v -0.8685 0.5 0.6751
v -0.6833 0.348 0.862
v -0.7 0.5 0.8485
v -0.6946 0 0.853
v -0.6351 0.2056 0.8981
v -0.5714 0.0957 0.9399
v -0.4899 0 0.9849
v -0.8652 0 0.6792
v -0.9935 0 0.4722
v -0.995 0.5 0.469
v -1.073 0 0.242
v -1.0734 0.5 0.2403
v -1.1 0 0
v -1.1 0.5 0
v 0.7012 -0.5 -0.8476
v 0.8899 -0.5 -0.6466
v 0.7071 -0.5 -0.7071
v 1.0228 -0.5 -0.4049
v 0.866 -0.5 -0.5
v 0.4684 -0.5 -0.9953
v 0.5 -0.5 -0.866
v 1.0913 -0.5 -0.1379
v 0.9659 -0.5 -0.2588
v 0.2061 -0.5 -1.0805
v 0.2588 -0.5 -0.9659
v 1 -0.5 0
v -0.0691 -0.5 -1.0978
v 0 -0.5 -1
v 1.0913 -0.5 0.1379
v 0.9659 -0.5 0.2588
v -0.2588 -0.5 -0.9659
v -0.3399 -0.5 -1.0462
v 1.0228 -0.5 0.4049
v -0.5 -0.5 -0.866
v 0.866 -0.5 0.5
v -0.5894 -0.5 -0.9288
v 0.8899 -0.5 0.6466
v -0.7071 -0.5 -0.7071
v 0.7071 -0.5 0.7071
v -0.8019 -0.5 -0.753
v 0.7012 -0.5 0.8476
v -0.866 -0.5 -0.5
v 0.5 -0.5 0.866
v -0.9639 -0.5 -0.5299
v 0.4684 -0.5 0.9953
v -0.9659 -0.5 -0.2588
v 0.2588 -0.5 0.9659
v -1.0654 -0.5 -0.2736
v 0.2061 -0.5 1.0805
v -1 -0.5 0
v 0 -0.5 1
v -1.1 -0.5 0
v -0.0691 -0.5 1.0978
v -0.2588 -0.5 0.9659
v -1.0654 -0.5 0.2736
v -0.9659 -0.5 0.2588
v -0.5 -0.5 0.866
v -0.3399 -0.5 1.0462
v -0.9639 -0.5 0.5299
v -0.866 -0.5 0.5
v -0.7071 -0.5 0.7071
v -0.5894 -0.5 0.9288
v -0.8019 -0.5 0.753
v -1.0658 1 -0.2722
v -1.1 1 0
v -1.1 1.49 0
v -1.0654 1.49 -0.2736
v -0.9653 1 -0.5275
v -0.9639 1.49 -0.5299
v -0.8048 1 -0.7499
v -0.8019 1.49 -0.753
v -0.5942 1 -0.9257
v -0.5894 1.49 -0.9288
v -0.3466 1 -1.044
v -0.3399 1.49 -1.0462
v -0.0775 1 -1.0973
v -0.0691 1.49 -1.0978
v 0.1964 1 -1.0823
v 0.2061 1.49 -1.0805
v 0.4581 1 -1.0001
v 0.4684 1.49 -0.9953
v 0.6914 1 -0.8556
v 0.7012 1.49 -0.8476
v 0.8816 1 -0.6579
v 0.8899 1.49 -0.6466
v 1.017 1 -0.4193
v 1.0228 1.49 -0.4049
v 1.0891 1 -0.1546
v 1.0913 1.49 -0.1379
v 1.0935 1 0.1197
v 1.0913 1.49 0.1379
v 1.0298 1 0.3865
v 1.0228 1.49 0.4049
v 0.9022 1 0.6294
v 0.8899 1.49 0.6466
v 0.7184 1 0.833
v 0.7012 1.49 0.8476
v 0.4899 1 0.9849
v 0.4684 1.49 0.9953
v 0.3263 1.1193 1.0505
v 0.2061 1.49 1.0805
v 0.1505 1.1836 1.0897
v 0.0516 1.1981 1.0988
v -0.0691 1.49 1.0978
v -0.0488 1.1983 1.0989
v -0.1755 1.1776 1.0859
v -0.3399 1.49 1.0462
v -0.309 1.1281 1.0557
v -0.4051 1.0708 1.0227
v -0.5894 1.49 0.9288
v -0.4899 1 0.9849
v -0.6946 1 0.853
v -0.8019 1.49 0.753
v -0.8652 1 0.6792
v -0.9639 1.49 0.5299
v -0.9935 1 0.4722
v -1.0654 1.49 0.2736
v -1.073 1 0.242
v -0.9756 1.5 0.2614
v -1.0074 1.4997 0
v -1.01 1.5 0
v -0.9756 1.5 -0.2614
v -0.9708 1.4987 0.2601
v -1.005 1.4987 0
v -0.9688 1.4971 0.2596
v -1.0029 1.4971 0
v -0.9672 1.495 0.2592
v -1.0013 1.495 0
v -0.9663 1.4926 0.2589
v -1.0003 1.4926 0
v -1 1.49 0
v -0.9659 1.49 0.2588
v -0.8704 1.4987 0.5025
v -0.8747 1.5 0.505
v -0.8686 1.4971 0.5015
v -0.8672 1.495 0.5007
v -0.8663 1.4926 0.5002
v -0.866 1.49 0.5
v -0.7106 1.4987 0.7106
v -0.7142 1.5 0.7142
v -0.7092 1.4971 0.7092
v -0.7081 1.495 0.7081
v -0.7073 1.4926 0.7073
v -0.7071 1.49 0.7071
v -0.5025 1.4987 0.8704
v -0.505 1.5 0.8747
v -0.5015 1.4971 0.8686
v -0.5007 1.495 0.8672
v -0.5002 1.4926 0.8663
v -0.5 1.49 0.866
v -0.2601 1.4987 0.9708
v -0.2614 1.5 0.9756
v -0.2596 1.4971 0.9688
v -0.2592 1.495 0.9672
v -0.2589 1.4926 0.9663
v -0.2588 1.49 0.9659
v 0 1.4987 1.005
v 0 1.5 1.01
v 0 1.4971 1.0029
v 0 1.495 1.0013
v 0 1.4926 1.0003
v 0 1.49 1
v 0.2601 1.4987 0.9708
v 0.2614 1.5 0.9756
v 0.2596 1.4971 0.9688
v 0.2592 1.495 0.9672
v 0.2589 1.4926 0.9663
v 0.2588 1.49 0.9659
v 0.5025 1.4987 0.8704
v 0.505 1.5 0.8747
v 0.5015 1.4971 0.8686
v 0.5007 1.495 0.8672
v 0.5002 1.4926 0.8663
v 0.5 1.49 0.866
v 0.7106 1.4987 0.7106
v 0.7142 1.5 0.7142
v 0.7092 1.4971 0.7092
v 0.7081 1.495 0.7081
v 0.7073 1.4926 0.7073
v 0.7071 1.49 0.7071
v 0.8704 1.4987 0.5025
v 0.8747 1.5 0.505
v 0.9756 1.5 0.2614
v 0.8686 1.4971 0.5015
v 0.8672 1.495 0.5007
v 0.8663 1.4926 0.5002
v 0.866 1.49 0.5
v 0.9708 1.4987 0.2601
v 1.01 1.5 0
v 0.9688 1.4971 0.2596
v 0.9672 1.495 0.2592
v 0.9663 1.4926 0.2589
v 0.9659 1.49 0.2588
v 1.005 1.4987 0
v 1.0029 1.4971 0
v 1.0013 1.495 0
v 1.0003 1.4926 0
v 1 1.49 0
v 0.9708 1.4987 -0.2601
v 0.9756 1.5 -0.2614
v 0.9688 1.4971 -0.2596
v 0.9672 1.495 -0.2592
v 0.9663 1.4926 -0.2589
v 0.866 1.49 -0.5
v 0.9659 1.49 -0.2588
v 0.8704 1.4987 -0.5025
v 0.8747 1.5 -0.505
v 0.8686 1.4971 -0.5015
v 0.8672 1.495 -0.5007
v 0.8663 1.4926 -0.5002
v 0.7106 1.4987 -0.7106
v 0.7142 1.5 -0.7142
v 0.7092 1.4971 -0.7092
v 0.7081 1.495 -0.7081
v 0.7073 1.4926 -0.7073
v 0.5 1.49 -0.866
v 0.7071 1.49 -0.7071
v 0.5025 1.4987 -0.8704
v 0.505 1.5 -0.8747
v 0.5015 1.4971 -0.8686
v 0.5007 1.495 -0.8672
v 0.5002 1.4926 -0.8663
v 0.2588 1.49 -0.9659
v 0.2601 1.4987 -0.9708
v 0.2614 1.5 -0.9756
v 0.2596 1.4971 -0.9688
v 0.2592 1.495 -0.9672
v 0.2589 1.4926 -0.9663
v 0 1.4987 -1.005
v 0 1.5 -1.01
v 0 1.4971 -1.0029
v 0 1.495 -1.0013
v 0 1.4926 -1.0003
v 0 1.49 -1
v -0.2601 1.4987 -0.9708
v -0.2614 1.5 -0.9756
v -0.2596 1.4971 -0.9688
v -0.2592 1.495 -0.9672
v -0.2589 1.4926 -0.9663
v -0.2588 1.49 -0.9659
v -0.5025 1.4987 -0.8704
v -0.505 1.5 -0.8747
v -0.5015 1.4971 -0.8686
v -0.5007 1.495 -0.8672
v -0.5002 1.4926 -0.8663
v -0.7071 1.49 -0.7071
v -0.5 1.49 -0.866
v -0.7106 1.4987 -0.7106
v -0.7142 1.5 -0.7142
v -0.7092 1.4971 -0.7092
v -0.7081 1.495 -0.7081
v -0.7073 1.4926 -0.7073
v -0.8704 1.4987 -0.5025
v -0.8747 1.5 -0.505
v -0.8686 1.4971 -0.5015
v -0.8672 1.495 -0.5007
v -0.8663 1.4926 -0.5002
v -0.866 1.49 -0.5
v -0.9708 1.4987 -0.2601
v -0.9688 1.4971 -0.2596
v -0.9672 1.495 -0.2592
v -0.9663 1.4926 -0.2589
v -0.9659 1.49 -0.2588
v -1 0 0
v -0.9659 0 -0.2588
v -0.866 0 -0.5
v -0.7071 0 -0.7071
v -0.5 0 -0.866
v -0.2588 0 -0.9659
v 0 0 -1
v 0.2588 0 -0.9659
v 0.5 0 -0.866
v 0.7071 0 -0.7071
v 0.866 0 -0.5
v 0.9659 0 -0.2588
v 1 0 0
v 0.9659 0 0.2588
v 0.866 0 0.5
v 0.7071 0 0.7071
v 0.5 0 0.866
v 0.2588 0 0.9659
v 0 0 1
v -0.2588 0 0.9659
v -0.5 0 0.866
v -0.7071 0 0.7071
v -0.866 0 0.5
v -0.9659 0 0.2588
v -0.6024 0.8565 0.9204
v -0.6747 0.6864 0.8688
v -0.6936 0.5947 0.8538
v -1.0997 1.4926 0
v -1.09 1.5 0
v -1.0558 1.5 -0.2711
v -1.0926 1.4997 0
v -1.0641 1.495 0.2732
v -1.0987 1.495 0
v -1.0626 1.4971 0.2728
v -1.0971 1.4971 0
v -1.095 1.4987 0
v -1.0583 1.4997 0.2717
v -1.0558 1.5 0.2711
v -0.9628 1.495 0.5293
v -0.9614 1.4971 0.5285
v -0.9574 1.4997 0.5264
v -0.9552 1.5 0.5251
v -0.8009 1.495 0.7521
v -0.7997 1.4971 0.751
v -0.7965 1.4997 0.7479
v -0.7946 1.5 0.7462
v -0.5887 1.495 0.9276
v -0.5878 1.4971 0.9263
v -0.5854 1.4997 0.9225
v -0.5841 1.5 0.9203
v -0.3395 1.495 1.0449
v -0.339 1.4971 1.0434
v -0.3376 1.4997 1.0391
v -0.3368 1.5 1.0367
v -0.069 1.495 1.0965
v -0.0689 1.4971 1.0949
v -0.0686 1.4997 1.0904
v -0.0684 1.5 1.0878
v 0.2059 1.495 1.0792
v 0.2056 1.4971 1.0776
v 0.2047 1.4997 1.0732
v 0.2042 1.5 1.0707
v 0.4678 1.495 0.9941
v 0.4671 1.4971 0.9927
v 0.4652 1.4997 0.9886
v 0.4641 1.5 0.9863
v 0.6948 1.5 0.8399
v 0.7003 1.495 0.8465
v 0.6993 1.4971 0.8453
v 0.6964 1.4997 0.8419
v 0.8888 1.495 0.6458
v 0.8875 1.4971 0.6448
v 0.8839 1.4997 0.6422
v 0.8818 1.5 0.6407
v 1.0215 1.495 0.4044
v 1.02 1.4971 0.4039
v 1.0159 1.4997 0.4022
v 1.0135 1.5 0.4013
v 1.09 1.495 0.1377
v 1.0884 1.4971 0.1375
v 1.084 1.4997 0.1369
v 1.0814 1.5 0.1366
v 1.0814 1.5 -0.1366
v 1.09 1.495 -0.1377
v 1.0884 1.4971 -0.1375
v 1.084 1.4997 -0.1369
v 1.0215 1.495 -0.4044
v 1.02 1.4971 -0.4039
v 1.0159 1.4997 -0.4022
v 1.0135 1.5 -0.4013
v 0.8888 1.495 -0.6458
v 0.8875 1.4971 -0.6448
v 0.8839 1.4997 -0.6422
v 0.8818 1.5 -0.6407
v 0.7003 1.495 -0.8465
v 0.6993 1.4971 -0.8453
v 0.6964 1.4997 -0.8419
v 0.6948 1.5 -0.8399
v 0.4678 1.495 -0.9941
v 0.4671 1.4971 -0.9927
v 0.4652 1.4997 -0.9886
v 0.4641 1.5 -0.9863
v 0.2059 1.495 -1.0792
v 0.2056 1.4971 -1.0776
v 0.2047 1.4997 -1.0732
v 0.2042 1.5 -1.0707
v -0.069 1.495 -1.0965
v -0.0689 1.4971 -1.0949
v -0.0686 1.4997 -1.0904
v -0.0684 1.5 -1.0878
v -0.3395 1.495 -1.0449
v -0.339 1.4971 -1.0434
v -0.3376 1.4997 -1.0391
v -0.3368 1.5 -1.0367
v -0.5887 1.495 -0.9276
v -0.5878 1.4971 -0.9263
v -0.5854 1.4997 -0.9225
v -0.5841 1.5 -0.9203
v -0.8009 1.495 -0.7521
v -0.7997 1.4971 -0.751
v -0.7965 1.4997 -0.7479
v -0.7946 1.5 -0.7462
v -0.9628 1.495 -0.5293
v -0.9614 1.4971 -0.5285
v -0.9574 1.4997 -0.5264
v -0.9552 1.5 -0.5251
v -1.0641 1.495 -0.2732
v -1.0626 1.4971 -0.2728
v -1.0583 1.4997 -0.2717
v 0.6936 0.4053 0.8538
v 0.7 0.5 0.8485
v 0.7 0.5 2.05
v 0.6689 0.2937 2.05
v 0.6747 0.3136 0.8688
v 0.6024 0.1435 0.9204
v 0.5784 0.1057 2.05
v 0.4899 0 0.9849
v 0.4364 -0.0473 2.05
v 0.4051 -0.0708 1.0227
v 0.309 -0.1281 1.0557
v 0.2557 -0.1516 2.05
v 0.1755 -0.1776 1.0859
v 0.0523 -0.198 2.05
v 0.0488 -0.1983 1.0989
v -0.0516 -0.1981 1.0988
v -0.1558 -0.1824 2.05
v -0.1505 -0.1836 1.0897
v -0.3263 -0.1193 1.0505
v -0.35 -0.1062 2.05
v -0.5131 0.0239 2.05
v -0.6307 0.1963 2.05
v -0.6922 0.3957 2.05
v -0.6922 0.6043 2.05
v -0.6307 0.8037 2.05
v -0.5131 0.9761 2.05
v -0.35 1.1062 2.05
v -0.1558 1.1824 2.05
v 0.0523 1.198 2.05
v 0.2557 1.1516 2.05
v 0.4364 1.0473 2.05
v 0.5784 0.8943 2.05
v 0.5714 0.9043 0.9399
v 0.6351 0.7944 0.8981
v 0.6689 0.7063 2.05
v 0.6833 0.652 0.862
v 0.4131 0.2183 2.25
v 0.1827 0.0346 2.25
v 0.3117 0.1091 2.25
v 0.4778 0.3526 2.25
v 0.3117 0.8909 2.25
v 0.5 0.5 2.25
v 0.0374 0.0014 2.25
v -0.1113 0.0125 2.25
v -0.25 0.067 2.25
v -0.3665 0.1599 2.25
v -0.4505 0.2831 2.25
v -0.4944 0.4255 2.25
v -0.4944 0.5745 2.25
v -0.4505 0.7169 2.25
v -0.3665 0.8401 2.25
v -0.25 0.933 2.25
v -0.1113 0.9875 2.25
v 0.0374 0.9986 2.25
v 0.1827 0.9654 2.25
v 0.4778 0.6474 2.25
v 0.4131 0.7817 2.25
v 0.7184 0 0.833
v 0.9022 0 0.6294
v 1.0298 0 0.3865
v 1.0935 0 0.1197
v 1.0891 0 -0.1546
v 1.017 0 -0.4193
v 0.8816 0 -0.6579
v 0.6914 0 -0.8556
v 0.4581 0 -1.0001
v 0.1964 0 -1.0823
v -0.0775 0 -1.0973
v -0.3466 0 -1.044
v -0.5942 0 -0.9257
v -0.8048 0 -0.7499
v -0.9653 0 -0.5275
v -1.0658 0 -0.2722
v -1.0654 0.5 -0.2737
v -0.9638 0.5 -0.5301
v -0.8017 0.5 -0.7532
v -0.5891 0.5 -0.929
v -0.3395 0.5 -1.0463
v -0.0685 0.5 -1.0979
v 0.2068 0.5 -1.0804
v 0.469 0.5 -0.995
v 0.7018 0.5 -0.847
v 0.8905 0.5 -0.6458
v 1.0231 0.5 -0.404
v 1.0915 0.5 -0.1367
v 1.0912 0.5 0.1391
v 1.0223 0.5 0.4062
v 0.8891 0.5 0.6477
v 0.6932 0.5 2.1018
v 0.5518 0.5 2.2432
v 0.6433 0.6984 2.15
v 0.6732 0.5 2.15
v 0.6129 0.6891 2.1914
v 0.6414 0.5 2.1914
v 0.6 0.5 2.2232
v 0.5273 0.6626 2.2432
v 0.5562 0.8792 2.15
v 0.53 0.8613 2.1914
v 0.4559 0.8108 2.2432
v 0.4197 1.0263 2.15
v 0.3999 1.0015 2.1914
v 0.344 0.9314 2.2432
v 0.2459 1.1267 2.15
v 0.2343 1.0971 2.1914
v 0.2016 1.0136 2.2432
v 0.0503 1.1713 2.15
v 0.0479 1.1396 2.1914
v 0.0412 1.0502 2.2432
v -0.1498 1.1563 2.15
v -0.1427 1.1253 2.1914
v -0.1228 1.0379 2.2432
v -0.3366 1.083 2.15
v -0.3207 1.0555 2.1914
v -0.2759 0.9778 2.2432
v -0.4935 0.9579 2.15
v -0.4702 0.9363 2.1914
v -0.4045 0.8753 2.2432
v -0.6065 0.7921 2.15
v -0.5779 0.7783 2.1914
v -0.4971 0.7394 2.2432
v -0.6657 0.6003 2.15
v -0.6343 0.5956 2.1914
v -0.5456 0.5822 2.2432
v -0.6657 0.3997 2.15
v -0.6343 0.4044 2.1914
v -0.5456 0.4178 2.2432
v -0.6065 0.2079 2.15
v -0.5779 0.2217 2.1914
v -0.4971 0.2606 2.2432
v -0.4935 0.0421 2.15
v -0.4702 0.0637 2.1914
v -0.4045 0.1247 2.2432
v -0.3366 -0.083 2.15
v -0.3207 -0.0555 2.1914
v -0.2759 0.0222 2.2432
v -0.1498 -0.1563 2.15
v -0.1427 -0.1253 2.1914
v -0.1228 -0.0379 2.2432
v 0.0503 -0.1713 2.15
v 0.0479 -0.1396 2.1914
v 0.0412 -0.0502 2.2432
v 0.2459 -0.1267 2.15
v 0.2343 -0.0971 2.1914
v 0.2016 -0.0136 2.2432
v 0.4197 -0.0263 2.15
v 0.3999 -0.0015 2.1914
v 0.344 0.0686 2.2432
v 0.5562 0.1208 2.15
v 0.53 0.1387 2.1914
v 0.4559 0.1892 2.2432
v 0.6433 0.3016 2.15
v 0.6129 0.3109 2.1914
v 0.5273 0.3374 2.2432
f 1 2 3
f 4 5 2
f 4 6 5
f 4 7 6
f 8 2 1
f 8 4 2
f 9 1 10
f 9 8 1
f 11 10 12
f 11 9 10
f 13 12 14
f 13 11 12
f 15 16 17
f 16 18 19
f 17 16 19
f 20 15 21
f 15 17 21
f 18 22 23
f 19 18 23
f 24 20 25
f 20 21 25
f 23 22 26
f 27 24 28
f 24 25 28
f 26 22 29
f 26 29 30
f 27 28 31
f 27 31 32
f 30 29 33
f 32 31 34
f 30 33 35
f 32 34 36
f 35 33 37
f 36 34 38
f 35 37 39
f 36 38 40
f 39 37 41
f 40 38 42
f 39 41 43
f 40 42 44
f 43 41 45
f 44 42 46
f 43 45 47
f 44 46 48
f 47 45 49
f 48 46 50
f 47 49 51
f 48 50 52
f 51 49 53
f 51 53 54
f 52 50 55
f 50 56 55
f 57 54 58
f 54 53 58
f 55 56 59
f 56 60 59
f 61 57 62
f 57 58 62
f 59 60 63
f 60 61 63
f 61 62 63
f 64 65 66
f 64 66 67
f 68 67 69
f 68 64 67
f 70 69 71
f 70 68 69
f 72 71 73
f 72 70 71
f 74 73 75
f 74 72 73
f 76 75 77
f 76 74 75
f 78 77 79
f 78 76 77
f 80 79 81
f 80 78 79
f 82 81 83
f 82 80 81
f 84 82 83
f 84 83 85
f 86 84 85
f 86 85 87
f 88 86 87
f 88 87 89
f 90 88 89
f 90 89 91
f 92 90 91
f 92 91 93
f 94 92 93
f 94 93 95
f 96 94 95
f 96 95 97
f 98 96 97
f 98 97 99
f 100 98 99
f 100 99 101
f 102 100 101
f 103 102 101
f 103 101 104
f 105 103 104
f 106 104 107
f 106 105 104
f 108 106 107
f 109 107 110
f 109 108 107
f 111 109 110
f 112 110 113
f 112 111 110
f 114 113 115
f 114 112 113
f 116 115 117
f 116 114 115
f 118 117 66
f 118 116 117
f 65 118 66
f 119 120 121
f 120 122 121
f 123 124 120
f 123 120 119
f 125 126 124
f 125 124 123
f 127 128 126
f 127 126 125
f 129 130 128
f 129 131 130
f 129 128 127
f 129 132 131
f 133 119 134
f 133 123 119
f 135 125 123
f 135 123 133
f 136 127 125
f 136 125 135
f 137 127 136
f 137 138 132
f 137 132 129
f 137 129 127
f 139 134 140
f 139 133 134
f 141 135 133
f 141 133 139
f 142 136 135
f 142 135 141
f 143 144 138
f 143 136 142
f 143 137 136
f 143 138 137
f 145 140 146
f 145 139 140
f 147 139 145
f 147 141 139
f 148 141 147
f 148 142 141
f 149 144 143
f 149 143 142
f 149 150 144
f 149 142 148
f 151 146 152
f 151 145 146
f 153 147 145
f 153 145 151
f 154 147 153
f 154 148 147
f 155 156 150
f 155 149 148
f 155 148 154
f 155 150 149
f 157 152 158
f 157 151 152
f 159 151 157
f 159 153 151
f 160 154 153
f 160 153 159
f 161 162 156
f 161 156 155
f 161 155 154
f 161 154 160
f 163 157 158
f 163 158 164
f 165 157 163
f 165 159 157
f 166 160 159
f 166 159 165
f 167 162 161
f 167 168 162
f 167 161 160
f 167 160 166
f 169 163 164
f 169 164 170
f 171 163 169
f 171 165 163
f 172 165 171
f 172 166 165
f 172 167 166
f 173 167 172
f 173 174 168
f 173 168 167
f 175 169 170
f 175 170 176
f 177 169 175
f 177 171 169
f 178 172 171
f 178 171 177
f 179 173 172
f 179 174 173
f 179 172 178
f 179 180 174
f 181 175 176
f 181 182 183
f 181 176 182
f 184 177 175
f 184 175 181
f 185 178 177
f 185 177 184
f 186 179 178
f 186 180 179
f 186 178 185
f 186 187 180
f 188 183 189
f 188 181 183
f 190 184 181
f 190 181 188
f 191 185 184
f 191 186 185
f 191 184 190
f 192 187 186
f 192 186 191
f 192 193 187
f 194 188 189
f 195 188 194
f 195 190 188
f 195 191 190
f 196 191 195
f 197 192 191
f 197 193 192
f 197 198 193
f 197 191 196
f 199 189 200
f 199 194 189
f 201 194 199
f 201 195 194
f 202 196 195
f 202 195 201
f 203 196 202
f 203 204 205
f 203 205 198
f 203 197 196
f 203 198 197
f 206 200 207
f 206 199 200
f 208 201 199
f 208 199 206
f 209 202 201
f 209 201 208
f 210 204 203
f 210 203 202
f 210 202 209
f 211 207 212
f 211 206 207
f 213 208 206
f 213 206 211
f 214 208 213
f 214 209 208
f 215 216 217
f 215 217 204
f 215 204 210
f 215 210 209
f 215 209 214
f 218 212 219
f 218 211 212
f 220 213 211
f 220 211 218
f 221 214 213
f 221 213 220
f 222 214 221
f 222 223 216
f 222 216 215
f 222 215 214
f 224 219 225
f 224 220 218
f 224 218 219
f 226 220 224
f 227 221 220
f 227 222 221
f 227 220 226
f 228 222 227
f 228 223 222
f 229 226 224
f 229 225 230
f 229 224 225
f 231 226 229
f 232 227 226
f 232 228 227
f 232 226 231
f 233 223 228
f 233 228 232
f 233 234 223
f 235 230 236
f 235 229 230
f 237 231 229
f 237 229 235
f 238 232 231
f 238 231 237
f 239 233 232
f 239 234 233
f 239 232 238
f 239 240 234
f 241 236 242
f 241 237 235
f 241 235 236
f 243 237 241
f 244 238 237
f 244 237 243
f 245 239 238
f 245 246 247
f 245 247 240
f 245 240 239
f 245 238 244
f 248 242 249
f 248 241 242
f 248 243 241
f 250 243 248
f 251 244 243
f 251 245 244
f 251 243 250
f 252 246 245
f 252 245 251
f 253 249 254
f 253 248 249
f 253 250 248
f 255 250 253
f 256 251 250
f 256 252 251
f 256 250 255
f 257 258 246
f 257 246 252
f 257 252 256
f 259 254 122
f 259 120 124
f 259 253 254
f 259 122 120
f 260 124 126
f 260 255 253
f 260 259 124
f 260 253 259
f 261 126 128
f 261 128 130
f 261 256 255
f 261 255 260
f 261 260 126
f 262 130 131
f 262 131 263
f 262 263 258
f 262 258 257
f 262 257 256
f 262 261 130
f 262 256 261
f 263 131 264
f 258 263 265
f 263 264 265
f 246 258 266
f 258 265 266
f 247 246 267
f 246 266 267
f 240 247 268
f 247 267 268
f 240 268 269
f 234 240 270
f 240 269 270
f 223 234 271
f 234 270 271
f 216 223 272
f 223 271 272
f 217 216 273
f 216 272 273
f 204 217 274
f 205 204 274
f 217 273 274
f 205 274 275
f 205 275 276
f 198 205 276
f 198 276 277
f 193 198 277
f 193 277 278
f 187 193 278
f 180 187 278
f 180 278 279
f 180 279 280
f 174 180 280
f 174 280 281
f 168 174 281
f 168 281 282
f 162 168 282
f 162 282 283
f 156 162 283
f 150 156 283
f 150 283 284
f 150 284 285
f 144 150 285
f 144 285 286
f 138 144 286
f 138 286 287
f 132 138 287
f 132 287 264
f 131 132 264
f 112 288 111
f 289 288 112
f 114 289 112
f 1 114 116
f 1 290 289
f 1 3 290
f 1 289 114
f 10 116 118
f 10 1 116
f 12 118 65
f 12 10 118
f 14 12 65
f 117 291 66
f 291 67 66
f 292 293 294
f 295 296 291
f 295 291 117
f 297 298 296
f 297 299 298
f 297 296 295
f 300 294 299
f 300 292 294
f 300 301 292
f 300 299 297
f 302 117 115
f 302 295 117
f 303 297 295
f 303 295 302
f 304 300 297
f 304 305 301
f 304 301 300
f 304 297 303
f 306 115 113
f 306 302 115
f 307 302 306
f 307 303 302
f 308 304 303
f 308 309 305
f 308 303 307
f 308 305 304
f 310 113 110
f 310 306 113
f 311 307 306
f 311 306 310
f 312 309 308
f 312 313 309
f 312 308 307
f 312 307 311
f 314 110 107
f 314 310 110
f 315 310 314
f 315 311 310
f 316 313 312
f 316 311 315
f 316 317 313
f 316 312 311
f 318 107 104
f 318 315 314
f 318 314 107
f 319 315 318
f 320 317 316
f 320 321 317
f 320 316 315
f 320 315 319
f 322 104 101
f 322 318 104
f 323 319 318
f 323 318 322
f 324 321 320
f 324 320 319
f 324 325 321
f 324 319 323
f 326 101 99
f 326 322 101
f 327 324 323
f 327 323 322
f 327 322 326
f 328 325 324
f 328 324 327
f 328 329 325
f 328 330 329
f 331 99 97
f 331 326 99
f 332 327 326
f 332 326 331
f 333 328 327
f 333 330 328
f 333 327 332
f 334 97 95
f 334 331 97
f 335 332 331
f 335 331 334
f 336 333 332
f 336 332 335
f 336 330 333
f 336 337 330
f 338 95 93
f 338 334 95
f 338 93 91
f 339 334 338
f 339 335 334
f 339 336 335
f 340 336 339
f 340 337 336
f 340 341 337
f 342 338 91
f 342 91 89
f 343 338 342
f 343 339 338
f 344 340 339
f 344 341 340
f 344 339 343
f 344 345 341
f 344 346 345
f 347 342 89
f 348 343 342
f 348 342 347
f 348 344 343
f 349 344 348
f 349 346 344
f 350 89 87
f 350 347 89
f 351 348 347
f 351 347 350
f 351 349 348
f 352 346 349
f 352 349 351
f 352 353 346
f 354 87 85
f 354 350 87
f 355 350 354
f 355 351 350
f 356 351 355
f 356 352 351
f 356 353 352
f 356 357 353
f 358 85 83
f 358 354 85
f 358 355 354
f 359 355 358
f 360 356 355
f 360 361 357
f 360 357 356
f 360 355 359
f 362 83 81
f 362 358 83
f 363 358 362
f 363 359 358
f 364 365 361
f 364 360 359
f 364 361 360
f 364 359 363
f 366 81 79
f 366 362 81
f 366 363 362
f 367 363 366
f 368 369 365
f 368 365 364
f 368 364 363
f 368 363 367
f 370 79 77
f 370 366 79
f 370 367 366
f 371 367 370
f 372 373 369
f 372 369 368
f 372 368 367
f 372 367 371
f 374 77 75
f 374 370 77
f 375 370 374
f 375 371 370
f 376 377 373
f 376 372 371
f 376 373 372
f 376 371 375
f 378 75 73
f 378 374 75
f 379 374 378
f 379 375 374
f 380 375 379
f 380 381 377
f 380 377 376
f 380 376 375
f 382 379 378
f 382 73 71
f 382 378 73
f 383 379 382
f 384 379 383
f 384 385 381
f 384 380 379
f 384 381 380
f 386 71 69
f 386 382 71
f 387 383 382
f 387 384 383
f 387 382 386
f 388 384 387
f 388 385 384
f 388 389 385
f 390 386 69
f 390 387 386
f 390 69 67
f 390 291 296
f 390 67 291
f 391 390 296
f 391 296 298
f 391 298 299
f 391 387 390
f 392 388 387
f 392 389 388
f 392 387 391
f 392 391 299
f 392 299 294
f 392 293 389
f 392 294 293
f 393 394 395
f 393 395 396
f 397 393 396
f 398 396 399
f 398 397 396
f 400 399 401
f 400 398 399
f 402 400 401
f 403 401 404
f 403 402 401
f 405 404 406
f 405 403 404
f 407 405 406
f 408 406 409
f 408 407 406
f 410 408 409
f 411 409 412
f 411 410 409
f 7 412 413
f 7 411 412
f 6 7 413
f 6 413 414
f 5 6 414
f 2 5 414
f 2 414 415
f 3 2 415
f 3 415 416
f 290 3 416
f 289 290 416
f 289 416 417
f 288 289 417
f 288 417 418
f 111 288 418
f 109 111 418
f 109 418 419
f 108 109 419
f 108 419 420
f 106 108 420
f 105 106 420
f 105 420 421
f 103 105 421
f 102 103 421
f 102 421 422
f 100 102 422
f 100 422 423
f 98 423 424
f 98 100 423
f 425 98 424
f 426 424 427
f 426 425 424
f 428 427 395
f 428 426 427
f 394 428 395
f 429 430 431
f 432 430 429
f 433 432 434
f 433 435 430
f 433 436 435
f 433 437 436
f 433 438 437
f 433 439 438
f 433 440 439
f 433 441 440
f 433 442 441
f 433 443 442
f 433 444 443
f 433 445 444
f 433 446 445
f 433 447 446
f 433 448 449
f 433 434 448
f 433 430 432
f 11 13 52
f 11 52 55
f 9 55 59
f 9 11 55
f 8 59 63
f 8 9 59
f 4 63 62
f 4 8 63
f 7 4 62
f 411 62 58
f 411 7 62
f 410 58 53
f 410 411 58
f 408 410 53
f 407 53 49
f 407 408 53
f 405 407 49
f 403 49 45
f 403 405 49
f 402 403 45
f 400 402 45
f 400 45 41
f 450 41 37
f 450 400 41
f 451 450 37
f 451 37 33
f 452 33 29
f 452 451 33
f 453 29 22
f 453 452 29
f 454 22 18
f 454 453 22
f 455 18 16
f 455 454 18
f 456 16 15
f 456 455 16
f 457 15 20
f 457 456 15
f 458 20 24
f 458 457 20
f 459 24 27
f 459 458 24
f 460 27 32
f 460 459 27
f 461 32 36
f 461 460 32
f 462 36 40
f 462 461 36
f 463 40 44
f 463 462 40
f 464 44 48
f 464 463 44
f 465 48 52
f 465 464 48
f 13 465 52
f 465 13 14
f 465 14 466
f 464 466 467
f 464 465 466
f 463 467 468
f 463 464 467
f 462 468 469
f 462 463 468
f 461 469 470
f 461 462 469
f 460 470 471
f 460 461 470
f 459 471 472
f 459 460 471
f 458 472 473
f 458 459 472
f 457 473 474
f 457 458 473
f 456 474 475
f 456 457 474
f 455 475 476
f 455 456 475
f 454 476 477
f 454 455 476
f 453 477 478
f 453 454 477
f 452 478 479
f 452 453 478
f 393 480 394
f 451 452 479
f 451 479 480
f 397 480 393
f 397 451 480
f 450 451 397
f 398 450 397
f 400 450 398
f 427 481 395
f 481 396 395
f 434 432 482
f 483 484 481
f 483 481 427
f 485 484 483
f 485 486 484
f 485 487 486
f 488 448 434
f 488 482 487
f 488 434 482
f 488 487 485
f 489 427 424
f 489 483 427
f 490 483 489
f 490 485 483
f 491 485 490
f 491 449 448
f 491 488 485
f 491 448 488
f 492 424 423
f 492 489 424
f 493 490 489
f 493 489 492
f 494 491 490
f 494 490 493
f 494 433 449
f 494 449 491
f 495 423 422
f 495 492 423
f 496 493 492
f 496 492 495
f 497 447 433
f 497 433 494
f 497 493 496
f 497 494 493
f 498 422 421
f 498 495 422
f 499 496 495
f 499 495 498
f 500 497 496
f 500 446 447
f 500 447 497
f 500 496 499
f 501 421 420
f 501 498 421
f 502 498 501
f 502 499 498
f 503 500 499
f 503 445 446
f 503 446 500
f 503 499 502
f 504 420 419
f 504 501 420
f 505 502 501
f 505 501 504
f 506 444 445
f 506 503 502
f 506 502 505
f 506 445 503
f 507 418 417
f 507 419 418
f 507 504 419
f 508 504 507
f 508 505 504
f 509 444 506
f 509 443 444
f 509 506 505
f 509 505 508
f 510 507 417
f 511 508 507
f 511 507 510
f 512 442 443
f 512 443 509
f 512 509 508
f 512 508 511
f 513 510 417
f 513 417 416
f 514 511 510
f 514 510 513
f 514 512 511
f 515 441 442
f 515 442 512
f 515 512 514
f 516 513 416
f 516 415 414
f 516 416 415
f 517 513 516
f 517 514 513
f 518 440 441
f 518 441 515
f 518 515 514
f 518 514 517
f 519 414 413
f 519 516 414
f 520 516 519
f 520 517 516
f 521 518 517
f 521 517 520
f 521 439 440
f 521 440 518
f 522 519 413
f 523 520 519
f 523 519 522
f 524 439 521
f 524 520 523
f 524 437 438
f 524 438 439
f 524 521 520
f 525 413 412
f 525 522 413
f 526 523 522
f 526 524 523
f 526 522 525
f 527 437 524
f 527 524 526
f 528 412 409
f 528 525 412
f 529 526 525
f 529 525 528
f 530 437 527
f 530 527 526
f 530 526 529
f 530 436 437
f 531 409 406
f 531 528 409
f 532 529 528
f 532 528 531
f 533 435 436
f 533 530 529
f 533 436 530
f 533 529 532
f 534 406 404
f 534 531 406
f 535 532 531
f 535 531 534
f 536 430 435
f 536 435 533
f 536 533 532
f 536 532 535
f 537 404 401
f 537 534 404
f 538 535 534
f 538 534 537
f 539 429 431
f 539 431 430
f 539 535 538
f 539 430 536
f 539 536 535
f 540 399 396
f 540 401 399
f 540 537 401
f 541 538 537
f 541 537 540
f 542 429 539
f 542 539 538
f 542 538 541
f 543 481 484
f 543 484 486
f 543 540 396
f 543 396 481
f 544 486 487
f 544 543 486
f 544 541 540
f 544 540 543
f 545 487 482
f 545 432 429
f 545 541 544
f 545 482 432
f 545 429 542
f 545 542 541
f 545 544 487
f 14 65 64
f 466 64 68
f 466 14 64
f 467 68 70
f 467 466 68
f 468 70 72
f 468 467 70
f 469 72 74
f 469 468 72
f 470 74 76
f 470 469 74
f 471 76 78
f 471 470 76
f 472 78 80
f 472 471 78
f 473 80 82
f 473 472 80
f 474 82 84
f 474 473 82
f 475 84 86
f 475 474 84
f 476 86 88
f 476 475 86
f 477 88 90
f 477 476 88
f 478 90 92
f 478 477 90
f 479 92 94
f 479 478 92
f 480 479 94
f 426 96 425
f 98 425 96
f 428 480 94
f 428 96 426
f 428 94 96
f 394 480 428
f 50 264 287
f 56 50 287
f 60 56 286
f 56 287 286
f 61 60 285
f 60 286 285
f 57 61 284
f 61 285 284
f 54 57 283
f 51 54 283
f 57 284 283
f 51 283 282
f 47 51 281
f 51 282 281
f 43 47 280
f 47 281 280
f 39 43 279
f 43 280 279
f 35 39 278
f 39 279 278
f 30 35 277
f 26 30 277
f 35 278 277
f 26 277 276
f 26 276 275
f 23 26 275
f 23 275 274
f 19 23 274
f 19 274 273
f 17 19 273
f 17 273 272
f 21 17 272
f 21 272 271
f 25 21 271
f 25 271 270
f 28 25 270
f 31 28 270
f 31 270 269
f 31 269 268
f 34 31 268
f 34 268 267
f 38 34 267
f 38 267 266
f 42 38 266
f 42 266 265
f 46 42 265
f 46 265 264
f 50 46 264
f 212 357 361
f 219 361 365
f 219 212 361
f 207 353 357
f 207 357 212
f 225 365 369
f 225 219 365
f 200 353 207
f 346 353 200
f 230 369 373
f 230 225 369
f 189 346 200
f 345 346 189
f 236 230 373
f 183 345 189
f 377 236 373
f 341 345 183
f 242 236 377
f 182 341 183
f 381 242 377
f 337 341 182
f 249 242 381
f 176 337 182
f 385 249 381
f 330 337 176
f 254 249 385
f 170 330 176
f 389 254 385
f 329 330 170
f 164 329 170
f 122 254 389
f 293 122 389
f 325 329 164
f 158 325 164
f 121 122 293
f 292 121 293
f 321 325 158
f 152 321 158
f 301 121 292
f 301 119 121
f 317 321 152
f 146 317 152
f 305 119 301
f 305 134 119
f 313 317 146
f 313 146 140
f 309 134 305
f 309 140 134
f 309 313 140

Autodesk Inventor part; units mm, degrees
ref_plane "YZ Plane" through (0, 0, 0) normal (1, 0, 0) x (0, 1, 0)
ref_plane "XY Plane" through (0, 0, 0) normal (0, 0, 1) x (1, 0, 0)
sketch "Sketch1" plane through (0, 0, 0) normal (0, 1, 0) x (-1, 0, 0)
  circle A0 centre (0, 0) radius 1
  circle A1 centre (0, 0) radius 1.1
  dimension "d0" = 2
  dimension "d1" = 2.2
extrude "Extrusion1" add sketch "Sketch1" along normal blind 1
sketch "Sketch2" plane through (0, 0, 0) normal (0, 0, 1) x (1, 0, 0)
  line L0 (1.1, 1) -> (-1.1, 1) projected
  line L1 (1.1, 0) -> (-1.1, 0) projected
  line L2 (1.1, 1) -> (-1.1, 1) projected
  line L3 (-1.1, 0) -> (-1.1, 1) projected
  line L4 (1.1, 0) -> (1.1, 1) projected
  line L5 (1.1, 0) -> (-1.1, 0) projected
  circle A0 centre (0, 0.5) radius 0.7
  point P0 (0, 0)
  dimension "d4" = 1.4
sketch "Sketch3" plane through (0, 0, 0) normal (0, 1, 0) x (-1, 0, 0)
  circle A0 centre (0, 0) radius 1.1 projected
  circle A1 centre (0, 0) radius 1 projected
ref_plane "Work Plane1" through (0, 0.5, 0) normal (0, 1, 0) x (-1, 0, 0)
sketch "Sketch4" plane through (0, 0.5, 0) normal (0, 1, 0) x (-1, 0, 0)
  circle A0 centre (0, 0) radius 1.1 projected
extrude "Extrusion2" add sketch "Sketch4" along normal mid plane 2
extrude "Extrusion3" add sketch "Sketch2" along normal blind 2.25 contours A0 L1 L0 | L0 A0 | A0 L1
extrude "Extrusion4" cut sketch "Sketch3" along normal through all both and the other way through all contours A1
fillet "Fillet1" radius 0.01 2 edges at (1.1, 1.5, 0) (1, 1.5, 0)
fillet "Fillet2" radius 0.2 1 edges at (-0.7, 0.5, 2.25)
properties part number "cilindros de dedo gordo"
